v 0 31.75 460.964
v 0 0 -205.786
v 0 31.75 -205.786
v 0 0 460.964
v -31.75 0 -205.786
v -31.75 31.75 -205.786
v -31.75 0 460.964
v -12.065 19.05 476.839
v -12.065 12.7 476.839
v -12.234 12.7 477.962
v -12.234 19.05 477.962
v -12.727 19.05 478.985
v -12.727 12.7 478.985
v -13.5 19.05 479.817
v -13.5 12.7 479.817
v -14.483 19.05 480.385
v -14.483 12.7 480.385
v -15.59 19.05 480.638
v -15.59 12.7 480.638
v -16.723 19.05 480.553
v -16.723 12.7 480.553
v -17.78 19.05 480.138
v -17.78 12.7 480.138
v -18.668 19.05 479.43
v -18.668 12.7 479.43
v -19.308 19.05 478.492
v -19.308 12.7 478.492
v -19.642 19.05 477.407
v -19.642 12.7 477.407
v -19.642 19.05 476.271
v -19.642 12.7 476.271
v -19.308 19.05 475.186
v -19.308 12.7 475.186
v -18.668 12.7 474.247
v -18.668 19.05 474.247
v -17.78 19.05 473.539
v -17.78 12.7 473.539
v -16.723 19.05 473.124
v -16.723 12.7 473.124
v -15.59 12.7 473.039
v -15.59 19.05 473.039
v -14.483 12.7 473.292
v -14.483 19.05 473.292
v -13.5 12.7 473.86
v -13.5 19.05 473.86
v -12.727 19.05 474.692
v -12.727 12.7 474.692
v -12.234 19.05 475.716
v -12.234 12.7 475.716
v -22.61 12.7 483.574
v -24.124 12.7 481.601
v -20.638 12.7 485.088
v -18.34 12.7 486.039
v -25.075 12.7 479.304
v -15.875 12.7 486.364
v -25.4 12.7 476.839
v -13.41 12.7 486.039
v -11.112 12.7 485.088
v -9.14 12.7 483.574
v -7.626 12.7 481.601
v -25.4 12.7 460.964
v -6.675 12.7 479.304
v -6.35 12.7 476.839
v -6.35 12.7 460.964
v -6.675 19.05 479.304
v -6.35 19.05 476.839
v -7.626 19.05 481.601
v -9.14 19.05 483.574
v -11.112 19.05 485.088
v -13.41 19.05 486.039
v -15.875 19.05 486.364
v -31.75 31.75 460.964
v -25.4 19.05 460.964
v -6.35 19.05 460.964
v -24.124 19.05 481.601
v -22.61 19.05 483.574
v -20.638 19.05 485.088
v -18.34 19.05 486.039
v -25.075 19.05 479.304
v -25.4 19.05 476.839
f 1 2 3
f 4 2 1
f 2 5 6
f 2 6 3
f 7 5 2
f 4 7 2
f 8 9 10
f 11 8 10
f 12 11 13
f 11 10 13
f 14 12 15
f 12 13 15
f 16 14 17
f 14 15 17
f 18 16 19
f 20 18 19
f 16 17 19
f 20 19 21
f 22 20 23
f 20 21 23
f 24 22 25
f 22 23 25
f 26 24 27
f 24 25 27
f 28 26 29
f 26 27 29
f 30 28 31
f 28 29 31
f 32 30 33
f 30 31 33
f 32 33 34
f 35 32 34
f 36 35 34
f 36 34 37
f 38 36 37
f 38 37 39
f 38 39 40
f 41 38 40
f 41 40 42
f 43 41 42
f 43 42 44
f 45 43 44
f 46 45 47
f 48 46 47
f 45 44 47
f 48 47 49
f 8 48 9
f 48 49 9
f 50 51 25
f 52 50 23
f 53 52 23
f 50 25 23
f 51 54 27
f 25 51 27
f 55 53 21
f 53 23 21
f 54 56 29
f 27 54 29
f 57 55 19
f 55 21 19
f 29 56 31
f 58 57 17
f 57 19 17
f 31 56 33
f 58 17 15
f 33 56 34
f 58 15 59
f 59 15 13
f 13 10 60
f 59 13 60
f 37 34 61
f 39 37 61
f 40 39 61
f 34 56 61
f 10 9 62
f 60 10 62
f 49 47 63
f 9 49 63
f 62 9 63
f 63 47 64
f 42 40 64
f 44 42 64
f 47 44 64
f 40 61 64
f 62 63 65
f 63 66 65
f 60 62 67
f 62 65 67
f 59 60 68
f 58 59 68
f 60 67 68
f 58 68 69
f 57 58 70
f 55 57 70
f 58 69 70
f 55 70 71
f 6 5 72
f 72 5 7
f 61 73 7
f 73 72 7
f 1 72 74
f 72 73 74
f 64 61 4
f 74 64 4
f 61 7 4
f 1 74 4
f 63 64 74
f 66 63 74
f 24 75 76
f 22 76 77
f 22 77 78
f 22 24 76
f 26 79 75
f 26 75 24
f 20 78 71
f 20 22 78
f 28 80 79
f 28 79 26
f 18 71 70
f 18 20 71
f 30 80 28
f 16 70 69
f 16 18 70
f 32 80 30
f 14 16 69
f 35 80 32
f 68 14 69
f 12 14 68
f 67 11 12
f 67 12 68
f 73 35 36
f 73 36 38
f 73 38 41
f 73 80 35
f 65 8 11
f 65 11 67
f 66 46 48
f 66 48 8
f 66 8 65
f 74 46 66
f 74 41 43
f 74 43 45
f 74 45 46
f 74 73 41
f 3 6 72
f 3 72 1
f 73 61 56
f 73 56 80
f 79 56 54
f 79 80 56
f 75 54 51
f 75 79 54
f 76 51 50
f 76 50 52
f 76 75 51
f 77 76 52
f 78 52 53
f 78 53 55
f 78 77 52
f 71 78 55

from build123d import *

# Parameters (mm, degrees)
F0_W     = 31.75
F0_H     = 666.75
F1_DEPTH = 31.75
F2_W     = 19.05
F2_H     = 6.35
F3_DEPTH = 25.4
F4_R     = 9.52499
F5_R     = 3.81
F6_DEPTH = 6.35


# Not quite as in the source:
# - a fillet or chamfer is up to 0.001 mm smaller than in the source, because OpenCascade refuses the exact size


with BuildPart() as f1:
    # F0 (on Front) → F1 (new body)
    with BuildSketch(Plane.XZ):
        with Locations((-15.875, 127.5886728781)):
            Rectangle(F0_W, F0_H)
    extrude(amount=-F1_DEPTH)

    # F2 (on face) → F3 (join)
    with BuildSketch(Plane.XY.offset(460.9636728781)):
        with Locations((-15.875, 15.875)):
            Rectangle(F2_W, F2_H)
    extrude(amount=F3_DEPTH)

    # F4 (radius 9.525 in the source; OpenCascade refuses exactly that, so slightly less here)
    f4_edges = [f1.edges().sort_by_distance(p)[0] for p in [
        (-6.35, 15.875, 486.363673),
        (-25.4, 15.875, 486.363673),
    ]]
    fillet(f4_edges, radius=F4_R)

    # F5 (on face) → F6 (cut)
    with BuildSketch(Plane.XZ.offset(-12.7)):
        with Locations((-15.875, 476.8386728781)):
            Circle(F5_R)
    extrude(amount=-F6_DEPTH, mode=Mode.SUBTRACT)


solid = f1.part
